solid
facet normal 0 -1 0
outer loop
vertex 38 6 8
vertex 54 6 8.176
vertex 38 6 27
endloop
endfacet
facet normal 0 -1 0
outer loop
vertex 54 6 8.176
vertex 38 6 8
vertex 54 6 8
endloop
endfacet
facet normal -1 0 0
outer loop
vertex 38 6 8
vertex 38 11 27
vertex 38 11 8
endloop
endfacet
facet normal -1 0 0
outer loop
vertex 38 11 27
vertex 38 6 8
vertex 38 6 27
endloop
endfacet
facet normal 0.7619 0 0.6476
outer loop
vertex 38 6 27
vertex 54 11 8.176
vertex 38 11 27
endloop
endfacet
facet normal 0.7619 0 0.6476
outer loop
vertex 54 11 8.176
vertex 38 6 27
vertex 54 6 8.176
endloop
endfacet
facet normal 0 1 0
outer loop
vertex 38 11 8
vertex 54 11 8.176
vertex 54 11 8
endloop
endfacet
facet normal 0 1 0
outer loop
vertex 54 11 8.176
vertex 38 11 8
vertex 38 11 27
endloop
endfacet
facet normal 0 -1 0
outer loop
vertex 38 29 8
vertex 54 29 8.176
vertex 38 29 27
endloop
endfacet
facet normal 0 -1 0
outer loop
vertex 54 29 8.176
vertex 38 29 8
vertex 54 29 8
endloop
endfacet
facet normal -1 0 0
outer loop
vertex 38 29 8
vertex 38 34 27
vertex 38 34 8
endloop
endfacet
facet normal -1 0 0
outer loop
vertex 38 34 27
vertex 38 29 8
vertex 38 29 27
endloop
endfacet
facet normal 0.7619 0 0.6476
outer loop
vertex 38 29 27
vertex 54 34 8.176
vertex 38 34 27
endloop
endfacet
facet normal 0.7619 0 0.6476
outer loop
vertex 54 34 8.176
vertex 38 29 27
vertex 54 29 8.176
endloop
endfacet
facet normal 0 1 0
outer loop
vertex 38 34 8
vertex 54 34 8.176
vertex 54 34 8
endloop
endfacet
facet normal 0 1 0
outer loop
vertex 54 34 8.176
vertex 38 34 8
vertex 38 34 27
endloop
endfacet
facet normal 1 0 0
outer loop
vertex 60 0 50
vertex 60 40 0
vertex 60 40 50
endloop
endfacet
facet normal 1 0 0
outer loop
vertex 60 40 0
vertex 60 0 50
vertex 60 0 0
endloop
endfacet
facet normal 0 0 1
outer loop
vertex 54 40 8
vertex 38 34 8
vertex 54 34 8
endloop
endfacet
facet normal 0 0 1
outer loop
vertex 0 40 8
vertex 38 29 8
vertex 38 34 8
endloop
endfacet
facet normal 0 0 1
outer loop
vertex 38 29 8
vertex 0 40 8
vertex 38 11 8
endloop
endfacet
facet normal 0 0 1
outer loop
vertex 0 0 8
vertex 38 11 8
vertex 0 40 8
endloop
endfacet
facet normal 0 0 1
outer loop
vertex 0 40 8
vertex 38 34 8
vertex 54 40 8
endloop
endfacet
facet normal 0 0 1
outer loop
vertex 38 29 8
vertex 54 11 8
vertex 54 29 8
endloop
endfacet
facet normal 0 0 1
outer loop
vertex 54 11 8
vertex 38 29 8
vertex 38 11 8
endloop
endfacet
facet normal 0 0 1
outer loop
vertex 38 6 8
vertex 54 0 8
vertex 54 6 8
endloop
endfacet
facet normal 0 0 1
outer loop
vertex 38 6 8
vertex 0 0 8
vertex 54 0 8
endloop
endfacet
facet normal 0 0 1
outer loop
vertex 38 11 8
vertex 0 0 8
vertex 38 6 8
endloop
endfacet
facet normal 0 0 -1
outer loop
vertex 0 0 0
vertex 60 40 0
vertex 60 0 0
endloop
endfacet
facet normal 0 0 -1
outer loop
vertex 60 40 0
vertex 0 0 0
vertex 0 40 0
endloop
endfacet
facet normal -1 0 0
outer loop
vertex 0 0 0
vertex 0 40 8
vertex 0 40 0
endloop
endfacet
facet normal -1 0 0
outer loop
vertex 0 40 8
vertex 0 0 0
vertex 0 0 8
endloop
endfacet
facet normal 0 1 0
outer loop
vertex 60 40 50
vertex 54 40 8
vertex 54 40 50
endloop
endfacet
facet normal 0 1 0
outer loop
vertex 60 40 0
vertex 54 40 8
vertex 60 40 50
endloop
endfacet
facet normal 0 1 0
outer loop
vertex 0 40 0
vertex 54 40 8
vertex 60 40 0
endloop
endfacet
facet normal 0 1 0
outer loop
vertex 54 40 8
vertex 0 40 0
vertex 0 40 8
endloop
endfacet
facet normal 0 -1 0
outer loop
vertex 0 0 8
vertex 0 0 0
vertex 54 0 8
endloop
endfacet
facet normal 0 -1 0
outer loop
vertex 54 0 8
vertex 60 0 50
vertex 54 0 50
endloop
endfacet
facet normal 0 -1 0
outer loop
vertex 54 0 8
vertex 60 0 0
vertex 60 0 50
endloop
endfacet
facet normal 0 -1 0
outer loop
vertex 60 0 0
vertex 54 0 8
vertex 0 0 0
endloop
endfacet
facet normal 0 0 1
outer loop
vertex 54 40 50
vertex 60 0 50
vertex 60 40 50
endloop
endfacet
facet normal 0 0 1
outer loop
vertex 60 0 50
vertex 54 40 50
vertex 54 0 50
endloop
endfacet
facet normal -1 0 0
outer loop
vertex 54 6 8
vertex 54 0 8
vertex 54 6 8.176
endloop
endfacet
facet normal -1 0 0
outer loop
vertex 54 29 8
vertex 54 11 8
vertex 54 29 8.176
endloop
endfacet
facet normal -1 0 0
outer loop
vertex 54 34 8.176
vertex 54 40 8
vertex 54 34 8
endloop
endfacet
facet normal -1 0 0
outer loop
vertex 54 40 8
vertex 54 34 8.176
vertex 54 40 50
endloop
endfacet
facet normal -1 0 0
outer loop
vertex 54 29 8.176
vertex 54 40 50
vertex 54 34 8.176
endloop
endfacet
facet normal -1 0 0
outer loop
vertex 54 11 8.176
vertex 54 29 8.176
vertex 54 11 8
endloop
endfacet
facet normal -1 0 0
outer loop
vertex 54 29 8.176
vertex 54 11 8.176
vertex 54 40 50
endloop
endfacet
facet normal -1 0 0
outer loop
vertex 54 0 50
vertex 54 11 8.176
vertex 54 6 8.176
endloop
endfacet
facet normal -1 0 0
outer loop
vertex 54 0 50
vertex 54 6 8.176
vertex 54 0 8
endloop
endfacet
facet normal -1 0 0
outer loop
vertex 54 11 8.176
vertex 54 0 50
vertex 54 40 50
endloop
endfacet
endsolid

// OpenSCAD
$fn = 32;

// ----------------------------------------------------------------------
// Rib bracket: 2-gusset L bracket
// ----------------------------------------------------------------------

// --- parameters (mm) ---
base_l = 60;              // foot length, X
base_w = 40;              // foot width, Y
base_t = 8;               // foot thickness
plate_t = 6;              // upright plate thickness
plate_h = 50;             // overall height
gus_l = 16;               // gusset leg along the foot
gus_h = 20;               // gusset height
gus_t = 5;                // gusset thickness
gus_edge = 6;             // gusset margin from the foot edge
n_gus = 2;                // gusset count
fit_tol = 0.05;           // tolerance for press fits, mm
free_tol = 0.3;           // tolerance for clearance fits, mm

gus_pitch = (base_w - 2 * gus_edge - gus_t) / (n_gus - 1);  // gusset pitch

union() {
  cube([base_l, base_w, base_t]);
  translate([base_l - plate_t, 0, base_t - 1])
    cube([plate_t, base_w, plate_h - base_t + 1]);
  for (i = [0 : n_gus - 1])
    translate([base_l - plate_t - gus_l, gus_edge + i * gus_pitch, base_t - 1])
      rotate([-90, 0, 0])
        linear_extrude(height = gus_t)
          polygon(points = [[0, 0], [gus_l + 1, 0], [0, -gus_h]]);
}
